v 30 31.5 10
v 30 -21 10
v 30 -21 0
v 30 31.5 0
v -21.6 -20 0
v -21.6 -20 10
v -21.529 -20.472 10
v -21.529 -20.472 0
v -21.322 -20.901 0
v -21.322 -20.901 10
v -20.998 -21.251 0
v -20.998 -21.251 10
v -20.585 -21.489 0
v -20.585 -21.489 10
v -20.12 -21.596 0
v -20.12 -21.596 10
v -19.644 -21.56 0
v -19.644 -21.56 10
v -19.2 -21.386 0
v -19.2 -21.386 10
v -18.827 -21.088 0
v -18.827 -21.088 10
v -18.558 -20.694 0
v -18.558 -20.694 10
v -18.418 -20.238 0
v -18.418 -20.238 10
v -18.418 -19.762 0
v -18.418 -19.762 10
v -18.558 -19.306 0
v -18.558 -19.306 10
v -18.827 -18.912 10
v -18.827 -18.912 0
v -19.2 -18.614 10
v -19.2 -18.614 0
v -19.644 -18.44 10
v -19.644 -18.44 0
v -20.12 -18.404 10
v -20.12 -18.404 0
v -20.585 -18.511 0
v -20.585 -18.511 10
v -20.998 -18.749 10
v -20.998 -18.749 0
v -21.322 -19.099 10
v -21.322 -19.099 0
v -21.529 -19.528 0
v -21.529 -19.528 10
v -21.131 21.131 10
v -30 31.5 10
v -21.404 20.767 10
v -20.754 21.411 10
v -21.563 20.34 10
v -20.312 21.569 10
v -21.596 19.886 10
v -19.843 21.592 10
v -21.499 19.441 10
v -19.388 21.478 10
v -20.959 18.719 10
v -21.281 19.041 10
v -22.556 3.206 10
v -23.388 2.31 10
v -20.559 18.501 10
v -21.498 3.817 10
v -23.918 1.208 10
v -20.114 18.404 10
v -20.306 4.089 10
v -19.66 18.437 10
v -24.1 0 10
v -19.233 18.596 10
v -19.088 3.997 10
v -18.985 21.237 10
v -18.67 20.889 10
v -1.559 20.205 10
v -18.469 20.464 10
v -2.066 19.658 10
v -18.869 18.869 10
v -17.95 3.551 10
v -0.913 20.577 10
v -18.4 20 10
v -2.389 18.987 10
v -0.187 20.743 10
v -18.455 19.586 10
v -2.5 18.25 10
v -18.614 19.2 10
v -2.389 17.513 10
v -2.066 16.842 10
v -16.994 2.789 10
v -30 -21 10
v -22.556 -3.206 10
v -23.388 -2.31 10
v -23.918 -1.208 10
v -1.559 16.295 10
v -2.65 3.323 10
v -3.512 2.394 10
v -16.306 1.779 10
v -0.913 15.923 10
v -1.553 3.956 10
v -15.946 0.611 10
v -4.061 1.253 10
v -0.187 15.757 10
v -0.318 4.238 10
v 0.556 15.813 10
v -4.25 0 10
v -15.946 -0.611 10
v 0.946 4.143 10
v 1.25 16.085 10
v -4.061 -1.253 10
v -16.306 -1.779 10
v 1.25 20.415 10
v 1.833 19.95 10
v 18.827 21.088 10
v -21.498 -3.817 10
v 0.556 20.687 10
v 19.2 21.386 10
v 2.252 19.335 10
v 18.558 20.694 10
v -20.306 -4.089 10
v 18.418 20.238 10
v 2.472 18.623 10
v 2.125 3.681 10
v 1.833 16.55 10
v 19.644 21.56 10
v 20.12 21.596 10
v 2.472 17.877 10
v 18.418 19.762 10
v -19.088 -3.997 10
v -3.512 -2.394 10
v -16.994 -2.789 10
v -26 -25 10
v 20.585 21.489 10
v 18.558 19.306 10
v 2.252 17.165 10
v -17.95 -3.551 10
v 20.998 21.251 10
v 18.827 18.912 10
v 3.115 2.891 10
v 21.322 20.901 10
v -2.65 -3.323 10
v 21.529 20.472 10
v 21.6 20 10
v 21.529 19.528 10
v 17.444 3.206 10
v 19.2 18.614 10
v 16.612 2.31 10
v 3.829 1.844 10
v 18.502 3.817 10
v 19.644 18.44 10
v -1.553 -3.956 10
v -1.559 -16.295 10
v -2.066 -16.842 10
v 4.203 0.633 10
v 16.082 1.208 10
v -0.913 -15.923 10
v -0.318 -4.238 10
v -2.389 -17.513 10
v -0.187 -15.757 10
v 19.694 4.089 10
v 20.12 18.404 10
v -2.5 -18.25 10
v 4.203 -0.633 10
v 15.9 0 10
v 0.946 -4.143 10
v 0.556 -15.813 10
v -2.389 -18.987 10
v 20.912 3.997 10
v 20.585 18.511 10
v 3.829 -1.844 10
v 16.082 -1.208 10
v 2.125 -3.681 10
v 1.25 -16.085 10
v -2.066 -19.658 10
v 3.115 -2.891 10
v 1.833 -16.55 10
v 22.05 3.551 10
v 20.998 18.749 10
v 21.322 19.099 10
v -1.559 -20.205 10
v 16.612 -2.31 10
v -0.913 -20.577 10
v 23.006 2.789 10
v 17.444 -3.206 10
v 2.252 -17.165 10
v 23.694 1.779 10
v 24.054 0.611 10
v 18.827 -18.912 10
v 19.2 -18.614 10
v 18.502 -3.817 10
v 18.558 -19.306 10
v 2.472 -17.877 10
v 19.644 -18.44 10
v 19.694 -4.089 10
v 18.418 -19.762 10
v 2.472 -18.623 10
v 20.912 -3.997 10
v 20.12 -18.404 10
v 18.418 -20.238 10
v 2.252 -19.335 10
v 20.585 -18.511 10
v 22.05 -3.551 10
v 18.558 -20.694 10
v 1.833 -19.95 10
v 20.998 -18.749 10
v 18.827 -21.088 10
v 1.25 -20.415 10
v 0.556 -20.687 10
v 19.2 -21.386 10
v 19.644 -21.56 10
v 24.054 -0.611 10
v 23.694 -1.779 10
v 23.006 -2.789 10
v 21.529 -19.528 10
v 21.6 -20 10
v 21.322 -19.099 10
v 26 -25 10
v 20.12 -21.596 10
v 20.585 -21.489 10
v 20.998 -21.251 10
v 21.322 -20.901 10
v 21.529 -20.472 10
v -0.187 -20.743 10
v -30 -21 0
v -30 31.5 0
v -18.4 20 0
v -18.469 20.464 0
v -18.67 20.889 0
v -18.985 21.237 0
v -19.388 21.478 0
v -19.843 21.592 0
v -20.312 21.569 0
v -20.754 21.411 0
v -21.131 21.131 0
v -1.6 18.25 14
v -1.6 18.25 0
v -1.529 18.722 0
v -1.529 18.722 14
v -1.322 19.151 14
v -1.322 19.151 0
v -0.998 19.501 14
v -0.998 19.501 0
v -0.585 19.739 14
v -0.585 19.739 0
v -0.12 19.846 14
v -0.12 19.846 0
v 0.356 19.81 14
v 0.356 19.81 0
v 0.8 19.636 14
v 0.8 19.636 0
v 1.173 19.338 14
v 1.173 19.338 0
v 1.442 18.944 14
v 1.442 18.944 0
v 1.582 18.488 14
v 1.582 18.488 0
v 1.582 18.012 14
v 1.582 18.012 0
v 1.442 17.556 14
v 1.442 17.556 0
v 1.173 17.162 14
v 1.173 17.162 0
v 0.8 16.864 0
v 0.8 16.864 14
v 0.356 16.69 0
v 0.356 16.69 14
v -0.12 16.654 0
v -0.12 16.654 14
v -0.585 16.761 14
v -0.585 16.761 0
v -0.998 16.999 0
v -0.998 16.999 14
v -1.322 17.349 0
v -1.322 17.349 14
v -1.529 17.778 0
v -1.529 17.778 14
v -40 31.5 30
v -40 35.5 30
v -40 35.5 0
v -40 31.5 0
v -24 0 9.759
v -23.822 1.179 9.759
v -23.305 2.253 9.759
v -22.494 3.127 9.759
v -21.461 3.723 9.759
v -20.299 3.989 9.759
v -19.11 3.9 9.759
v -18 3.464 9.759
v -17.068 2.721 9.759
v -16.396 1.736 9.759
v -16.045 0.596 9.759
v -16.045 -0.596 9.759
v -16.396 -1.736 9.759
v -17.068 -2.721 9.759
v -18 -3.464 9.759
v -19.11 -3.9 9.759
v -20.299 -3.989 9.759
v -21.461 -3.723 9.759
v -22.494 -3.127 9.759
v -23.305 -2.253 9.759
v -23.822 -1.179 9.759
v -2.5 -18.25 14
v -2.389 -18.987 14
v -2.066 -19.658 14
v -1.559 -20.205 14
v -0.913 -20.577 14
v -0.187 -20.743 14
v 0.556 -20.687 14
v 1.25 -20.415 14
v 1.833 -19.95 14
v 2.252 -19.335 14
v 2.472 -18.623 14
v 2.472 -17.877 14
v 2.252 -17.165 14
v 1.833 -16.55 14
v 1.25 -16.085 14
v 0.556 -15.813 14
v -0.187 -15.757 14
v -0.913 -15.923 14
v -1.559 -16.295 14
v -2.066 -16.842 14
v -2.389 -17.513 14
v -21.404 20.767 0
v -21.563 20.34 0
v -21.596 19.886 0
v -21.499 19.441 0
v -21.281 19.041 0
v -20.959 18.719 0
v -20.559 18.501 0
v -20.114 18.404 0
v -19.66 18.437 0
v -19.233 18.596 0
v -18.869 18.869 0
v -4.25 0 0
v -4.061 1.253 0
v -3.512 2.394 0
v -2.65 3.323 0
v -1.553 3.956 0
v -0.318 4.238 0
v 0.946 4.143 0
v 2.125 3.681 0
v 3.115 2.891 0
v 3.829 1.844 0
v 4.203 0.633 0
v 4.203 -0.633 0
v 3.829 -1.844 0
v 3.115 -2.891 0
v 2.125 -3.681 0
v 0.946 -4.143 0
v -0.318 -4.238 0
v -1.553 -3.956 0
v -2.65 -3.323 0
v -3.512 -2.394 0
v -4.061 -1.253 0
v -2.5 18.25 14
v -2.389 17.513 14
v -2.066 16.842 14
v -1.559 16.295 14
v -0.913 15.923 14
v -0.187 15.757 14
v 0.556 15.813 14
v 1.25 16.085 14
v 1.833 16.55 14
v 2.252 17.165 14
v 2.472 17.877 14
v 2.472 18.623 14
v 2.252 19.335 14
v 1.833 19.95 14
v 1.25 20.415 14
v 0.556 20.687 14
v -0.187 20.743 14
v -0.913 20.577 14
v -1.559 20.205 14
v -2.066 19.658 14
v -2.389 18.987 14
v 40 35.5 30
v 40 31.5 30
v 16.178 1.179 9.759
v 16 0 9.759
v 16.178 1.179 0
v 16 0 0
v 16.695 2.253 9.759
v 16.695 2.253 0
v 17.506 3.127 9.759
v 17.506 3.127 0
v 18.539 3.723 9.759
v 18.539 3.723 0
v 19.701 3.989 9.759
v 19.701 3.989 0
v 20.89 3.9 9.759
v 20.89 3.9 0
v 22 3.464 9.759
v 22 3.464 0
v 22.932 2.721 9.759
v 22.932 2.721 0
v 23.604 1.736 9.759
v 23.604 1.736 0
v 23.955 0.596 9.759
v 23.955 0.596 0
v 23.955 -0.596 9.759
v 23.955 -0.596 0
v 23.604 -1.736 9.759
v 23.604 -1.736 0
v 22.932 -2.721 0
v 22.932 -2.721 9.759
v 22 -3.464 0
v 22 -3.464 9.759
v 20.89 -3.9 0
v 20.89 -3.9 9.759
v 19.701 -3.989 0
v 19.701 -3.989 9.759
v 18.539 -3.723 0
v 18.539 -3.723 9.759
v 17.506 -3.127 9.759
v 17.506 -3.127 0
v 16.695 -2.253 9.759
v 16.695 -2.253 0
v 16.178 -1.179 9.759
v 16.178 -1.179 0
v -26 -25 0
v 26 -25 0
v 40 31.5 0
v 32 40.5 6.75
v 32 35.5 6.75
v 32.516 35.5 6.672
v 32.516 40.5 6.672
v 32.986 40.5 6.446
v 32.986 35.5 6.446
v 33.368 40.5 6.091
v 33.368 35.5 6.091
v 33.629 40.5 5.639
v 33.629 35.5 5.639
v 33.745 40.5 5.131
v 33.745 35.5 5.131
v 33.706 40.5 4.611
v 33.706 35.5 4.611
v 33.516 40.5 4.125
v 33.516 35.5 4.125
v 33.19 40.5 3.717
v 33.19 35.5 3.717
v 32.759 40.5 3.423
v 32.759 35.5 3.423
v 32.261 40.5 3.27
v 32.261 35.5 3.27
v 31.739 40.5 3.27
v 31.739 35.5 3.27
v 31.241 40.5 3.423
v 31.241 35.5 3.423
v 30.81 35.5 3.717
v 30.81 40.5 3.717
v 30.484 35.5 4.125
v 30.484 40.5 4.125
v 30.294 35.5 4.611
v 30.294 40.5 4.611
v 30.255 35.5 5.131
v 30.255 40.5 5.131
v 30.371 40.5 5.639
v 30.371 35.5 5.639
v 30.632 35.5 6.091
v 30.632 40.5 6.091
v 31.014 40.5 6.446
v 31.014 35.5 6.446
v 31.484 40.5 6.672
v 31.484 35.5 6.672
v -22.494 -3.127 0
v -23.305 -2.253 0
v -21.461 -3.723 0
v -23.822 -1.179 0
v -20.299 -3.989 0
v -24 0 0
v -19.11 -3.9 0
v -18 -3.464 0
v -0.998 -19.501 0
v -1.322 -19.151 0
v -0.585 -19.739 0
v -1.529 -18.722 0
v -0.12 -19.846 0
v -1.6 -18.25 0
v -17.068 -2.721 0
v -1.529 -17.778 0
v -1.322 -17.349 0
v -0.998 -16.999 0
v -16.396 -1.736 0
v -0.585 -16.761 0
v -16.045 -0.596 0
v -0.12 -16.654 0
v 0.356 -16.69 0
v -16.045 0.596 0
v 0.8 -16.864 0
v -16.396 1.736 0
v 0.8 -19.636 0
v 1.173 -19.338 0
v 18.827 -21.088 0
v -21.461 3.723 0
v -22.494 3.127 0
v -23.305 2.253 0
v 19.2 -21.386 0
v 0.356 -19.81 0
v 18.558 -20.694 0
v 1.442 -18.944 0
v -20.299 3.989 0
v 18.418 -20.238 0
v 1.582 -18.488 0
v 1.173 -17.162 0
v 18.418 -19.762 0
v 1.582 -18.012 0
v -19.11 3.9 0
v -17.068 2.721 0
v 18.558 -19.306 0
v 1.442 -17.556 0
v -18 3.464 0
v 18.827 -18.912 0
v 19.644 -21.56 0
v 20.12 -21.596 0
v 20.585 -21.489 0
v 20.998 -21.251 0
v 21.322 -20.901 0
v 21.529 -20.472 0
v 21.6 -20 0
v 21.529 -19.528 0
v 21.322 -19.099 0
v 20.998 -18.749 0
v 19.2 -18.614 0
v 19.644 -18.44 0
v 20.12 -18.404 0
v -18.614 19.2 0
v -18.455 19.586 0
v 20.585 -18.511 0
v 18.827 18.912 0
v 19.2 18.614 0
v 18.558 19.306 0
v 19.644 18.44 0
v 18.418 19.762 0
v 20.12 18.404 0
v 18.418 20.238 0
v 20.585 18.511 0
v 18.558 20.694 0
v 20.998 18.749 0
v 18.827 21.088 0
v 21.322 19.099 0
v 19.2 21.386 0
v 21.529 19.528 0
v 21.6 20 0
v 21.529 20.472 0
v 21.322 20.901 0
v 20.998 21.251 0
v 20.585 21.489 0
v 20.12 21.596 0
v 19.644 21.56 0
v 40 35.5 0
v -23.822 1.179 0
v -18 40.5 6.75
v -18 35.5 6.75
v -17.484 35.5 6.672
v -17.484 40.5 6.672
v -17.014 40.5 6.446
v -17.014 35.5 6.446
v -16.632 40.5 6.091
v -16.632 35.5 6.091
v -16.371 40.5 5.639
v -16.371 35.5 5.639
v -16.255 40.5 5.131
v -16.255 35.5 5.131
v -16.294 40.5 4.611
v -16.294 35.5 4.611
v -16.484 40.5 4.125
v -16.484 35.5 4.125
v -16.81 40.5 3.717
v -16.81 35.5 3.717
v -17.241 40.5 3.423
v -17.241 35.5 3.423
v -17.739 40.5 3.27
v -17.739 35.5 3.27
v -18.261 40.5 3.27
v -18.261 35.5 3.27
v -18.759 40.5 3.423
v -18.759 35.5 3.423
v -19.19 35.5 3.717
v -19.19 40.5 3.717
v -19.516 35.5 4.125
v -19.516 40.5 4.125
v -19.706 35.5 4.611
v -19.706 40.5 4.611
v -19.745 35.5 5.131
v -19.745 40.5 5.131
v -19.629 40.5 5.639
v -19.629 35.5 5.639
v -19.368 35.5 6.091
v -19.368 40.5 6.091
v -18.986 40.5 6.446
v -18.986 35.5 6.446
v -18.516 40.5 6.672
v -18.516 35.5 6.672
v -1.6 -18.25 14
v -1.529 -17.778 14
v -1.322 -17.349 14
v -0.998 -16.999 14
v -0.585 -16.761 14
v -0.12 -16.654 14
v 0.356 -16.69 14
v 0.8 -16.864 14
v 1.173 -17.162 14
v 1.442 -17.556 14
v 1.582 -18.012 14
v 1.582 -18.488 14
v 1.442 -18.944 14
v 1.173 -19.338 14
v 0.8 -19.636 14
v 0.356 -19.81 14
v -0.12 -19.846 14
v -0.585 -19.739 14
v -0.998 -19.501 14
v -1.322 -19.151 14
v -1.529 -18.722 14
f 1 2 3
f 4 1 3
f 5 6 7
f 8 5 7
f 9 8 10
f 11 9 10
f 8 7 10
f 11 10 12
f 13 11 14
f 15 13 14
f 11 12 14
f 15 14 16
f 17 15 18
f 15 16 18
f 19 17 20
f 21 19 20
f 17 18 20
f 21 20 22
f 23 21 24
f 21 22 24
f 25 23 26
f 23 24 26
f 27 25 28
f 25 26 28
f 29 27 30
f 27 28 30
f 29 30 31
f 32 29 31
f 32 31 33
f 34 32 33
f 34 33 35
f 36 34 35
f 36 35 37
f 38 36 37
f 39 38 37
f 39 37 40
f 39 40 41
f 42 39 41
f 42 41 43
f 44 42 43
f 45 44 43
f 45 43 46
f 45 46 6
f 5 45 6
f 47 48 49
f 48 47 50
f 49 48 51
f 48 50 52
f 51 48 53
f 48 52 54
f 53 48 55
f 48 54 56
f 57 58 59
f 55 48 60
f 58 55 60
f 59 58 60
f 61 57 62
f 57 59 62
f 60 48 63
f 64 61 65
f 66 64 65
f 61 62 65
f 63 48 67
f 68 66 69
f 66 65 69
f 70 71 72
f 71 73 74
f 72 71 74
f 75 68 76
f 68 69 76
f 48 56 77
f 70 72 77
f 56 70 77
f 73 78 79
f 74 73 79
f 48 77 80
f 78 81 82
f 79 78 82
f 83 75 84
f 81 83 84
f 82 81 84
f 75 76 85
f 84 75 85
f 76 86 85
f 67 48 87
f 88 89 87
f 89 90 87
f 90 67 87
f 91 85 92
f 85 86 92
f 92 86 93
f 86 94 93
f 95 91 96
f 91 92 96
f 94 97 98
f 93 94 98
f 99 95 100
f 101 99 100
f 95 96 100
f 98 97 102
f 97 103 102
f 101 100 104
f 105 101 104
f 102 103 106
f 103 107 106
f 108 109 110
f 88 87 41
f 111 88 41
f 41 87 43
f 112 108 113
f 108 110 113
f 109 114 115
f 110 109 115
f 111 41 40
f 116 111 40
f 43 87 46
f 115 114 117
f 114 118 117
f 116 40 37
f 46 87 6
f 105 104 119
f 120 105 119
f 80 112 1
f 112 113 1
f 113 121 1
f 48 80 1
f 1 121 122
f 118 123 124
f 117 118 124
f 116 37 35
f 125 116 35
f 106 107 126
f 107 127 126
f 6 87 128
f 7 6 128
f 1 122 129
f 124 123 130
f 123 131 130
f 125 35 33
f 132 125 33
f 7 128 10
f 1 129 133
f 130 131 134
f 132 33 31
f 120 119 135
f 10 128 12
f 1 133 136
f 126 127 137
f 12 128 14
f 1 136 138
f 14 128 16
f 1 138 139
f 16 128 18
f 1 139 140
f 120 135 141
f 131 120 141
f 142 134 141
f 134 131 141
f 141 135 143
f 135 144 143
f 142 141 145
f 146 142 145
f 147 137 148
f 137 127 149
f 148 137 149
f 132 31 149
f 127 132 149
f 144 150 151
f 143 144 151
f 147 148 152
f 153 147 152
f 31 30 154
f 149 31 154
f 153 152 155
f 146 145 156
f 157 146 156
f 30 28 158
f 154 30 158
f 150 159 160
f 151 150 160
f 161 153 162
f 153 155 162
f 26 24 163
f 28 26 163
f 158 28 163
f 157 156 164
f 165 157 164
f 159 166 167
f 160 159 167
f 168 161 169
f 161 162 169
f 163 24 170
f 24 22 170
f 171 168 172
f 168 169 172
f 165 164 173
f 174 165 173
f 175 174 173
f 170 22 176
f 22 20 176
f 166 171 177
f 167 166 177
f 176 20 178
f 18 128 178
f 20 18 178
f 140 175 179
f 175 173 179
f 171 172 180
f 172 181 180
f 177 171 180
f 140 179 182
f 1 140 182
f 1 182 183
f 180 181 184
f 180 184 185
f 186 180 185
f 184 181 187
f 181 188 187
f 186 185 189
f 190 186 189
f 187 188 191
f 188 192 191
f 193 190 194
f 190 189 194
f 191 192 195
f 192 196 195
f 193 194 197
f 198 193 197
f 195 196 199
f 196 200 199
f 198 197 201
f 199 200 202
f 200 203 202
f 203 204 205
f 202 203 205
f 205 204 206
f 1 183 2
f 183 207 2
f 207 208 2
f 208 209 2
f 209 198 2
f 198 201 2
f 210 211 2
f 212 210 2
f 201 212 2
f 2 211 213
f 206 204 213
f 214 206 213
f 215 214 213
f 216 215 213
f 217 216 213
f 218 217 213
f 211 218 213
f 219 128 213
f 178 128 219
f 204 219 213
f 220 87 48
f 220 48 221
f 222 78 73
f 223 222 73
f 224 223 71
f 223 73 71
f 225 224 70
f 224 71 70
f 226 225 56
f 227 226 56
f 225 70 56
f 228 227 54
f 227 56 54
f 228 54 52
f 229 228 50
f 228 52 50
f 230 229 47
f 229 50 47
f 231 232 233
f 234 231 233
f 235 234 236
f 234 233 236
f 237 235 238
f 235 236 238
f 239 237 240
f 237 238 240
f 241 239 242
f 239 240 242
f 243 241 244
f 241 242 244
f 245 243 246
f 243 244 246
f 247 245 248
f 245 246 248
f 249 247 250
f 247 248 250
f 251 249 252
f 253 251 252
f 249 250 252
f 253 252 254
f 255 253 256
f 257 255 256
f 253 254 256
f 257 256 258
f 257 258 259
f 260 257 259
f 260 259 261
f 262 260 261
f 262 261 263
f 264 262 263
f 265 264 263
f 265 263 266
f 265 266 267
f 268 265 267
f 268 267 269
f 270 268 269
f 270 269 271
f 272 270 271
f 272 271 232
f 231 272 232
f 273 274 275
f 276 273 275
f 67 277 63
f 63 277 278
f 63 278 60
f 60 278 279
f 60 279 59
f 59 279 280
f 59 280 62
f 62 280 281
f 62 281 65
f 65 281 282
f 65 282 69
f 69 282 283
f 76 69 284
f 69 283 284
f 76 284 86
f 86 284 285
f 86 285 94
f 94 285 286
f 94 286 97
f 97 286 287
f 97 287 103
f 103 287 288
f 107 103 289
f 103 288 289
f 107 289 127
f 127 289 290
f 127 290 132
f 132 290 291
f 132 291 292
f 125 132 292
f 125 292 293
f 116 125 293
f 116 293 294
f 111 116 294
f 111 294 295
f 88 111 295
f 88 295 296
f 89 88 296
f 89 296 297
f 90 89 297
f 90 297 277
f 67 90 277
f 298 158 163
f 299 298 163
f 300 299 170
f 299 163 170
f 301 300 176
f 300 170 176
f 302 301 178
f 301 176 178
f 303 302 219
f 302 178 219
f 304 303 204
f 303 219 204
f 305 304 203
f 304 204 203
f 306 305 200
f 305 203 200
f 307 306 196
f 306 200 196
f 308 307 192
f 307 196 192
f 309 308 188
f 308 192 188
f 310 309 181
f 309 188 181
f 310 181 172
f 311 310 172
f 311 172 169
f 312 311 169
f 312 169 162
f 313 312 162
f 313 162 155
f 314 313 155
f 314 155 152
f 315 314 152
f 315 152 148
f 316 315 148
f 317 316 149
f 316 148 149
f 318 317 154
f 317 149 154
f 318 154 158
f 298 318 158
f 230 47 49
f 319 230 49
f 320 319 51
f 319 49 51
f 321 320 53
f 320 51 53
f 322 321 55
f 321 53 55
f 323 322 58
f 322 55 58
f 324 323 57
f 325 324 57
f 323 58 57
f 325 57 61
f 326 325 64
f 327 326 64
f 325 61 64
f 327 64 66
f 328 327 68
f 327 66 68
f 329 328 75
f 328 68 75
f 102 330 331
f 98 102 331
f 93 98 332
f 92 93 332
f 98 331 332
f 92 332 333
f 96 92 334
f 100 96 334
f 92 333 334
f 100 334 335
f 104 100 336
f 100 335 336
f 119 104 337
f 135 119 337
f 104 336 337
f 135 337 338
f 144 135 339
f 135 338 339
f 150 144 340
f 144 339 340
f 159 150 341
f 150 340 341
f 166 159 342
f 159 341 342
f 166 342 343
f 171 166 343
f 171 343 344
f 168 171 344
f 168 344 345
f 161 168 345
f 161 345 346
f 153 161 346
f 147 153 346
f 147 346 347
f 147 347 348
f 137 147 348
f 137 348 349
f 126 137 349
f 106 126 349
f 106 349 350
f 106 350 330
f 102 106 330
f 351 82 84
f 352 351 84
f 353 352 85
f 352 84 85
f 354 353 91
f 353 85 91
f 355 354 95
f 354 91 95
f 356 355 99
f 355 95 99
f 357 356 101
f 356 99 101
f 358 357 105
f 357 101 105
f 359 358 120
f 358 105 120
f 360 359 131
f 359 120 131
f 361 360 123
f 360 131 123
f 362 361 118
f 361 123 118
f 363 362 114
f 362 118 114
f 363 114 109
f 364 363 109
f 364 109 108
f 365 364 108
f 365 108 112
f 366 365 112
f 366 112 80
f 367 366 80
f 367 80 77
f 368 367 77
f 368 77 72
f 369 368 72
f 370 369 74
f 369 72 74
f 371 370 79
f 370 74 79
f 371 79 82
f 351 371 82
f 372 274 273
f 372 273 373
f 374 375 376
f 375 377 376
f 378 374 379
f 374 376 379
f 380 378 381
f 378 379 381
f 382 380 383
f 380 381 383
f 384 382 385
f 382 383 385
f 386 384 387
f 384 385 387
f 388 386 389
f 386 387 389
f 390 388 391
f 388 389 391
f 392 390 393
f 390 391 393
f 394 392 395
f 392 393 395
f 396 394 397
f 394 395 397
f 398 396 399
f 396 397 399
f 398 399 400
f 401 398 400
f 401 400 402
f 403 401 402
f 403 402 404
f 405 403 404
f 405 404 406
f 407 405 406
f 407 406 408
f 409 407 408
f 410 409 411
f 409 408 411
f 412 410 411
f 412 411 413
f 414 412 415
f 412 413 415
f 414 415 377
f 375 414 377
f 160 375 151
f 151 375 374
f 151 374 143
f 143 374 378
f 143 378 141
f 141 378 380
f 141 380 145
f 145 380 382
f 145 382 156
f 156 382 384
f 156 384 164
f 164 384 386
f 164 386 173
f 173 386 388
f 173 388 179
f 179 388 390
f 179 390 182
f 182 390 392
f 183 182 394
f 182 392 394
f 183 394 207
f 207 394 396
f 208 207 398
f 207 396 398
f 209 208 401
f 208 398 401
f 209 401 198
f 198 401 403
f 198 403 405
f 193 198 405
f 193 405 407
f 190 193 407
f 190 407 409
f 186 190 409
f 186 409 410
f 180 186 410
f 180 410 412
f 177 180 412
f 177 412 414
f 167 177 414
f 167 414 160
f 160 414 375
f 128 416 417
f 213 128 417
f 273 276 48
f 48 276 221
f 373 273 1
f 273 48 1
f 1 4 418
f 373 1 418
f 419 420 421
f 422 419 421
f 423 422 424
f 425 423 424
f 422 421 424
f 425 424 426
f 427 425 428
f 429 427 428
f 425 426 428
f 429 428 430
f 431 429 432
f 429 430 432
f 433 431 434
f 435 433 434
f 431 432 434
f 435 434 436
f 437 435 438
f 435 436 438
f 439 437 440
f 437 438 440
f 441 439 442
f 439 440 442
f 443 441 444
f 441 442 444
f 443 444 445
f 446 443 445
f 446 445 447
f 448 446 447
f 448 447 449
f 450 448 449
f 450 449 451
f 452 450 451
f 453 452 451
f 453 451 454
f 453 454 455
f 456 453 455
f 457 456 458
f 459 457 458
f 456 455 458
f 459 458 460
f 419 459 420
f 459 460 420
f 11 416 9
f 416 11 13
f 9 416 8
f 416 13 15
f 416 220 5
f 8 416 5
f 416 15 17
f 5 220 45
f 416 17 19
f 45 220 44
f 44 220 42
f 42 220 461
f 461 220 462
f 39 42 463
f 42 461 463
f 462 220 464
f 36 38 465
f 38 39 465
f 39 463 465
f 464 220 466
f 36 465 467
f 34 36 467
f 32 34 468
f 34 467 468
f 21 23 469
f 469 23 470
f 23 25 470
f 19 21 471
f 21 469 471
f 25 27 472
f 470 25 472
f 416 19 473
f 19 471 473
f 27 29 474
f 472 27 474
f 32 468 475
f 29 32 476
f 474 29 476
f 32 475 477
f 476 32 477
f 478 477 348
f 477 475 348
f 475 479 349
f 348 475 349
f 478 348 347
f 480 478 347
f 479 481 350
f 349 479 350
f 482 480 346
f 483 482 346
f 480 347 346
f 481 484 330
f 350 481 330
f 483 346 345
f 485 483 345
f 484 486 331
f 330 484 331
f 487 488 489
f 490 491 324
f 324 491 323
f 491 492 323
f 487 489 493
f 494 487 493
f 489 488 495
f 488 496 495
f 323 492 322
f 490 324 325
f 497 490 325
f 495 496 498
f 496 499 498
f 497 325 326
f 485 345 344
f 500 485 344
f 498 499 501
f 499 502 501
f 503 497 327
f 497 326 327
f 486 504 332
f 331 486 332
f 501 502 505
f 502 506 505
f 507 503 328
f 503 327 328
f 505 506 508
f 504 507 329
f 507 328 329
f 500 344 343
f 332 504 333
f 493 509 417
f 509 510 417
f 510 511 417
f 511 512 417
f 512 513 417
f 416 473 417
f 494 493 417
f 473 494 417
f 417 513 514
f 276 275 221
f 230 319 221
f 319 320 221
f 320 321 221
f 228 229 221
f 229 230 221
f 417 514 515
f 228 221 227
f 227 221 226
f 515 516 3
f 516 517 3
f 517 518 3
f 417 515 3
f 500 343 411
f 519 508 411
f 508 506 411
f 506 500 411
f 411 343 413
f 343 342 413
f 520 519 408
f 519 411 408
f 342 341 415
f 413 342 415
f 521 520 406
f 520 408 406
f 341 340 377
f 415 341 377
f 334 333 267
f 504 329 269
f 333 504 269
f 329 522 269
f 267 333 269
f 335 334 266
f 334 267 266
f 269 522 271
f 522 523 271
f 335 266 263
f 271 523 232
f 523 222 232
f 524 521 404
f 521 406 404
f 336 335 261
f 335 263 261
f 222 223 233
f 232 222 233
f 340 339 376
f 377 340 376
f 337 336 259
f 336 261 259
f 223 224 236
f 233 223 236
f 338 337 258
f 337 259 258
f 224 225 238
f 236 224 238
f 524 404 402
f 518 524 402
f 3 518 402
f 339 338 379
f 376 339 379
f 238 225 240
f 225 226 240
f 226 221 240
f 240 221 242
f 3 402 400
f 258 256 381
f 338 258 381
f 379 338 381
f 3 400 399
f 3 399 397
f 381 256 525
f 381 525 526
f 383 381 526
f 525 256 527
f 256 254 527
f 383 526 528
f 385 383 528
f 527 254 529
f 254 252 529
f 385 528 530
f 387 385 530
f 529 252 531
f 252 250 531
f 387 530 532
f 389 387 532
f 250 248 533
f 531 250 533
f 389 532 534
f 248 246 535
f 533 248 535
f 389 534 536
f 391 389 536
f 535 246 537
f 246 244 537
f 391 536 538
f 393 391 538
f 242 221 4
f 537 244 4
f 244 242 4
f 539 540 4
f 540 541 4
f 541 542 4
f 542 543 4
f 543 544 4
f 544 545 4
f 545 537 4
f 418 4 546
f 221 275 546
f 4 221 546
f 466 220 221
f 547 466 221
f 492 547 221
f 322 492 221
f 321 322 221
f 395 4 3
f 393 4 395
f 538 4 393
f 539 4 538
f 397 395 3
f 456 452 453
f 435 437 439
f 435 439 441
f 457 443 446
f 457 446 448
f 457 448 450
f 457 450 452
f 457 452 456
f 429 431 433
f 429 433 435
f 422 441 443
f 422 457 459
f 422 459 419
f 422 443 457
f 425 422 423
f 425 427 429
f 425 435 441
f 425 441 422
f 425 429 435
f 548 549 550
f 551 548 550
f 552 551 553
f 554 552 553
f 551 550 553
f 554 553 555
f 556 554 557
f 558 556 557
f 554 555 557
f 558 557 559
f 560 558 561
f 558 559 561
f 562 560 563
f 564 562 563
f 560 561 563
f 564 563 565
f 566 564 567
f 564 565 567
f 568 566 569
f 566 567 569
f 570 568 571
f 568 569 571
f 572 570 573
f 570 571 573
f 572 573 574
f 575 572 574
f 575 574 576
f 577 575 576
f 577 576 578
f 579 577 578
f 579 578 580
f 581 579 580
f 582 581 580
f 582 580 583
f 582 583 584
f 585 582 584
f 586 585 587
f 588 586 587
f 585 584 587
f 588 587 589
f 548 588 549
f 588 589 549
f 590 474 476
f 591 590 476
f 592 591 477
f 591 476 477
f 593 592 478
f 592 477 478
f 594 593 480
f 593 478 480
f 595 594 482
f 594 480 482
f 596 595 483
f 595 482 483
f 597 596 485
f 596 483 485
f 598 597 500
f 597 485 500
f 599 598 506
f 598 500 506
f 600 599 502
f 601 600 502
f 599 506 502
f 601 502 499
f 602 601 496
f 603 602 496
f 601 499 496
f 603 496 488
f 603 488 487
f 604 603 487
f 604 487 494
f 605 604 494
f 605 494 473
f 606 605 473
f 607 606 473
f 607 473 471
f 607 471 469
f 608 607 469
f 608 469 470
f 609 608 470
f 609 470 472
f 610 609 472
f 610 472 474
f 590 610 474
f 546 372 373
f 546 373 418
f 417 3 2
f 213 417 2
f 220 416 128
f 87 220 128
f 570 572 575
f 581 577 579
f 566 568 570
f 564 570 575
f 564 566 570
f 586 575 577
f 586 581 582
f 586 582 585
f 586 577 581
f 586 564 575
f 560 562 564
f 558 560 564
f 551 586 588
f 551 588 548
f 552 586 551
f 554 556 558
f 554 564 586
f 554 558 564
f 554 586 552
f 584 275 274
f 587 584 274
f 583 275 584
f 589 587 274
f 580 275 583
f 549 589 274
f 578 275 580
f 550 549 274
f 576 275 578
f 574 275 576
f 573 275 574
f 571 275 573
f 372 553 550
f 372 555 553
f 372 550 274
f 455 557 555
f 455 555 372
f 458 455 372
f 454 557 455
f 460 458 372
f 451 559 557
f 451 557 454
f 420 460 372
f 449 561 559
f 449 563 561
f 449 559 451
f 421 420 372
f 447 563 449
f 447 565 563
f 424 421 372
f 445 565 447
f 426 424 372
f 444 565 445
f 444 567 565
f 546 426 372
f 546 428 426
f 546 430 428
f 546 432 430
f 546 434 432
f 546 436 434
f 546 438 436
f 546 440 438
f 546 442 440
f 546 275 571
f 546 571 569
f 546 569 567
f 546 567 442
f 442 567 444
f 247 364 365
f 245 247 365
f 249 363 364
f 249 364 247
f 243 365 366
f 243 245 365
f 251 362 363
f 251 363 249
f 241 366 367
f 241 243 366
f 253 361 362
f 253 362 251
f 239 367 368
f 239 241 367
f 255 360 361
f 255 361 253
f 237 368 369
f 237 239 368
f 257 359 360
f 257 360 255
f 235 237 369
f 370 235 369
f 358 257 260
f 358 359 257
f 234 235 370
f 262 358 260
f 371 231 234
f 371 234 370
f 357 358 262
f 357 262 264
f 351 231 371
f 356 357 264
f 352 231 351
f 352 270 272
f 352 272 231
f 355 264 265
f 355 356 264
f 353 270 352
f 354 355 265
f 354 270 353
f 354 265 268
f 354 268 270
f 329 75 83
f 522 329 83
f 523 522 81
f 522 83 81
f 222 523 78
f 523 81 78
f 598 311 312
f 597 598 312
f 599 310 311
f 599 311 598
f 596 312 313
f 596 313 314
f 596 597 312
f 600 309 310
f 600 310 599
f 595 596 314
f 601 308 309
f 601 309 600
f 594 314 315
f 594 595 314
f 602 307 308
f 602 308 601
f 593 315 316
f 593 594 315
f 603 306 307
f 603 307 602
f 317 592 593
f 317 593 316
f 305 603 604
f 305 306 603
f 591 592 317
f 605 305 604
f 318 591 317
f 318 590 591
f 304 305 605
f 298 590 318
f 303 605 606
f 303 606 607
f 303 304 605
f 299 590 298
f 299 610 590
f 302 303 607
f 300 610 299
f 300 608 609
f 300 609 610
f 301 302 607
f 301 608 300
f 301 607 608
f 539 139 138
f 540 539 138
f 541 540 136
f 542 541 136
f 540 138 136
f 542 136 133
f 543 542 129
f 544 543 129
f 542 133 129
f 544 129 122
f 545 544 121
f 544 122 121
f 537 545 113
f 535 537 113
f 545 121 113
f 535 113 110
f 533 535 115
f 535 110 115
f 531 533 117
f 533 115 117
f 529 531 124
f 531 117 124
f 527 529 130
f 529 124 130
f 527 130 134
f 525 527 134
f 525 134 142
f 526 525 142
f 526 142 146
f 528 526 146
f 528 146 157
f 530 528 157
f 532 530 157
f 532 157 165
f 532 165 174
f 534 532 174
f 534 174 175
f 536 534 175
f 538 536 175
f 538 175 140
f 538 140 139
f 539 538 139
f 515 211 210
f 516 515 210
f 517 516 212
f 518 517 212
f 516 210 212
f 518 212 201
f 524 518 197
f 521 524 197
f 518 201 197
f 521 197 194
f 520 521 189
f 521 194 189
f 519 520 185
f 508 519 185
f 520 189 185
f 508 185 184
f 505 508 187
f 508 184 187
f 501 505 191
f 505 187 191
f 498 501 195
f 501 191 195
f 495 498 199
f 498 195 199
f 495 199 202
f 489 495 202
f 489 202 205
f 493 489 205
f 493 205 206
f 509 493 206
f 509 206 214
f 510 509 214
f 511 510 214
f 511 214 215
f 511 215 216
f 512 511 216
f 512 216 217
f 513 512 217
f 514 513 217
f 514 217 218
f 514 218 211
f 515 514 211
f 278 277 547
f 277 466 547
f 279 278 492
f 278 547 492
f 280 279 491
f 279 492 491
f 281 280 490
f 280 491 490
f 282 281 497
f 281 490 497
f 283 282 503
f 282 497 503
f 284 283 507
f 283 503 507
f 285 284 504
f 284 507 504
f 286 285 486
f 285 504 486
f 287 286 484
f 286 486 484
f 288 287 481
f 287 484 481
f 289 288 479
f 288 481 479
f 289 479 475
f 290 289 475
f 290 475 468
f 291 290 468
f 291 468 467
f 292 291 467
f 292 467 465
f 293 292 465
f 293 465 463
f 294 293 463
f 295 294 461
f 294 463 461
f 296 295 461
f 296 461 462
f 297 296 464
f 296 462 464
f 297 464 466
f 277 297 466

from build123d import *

# Parameters (mm, degrees)
SKETCH_1_W                = 60
SKETCH_1_H                = 50
EXTRUDE_1_DEPTH           = 10
HOLE_WIZARD_1_D           = 8.5
HOLE_WIZARD_1_DEPTH       = 20
HOLE_WIZARD_2_D           = 8
HOLE_WIZARD_2_CSINK_D     = 8.2
HOLE_WIZARD_2_CSINK_ANGLE = 45
SKETCH_9_R                = 2.5
EXTRUDE_3_DEPTH           = 4
HOLE_WIZARD_3_D           = 3.2
CHAMFER_1_SIZE            = 4
SKETCH_15_R               = 1.6
CUT_EXTRUDE_1_DEPTH       = 41.311288741
SKETCH_16_W               = 60
SKETCH_16_H               = 10
EXTRUDE_4_DEPTH           = 10.5
SKETCH_17_W               = 80
SKETCH_17_H               = 30
EXTRUDE_5_DEPTH           = 4
SKETCH_18_R               = 1.75
EXTRUDE_6_DEPTH           = 5


with BuildPart() as part:
    # 草图1 → 凸台-拉伸1 (new body)
    with BuildSketch(Plane.XY):
        Rectangle(SKETCH_1_W, SKETCH_1_H)
    extrude(amount=EXTRUDE_1_DEPTH)

    # 孔1
    with Locations(Plane.XY.offset(10)):
        with Locations((0, 0)):
            Hole(HOLE_WIZARD_1_D / 2, depth=HOLE_WIZARD_1_DEPTH)

    # 孔2 (through all)
    with Locations(Plane.XY.offset(10)):
        with Locations((20, 0), (-20, 0)):
            CounterSinkHole(HOLE_WIZARD_2_D / 2, HOLE_WIZARD_2_CSINK_D / 2, counter_sink_angle=HOLE_WIZARD_2_CSINK_ANGLE)

    # 草图9 → 凸台-拉伸3 (add)
    with BuildSketch(Plane.XY.offset(10)):
        with Locations(Location((0, 18.25, 0), (0, 0, 180))):
            Circle(SKETCH_9_R)
        with Locations(Location((0, -18.25, 0), (0, 0, 180))):
            Circle(SKETCH_9_R)
    extrude(amount=EXTRUDE_3_DEPTH)

    # 孔3 (through all)
    with Locations(Plane.XY.offset(14)):
        with Locations((0, 18.25), (0, -18.25)):
            Hole(HOLE_WIZARD_3_D / 2)

    # 倒角1
    chamfer_1_edges = [part.edges().sort_by_distance(p)[0] for p in [
        (30, -25, 5),
        (-30, -25, 5),
    ]]
    chamfer(chamfer_1_edges, length=CHAMFER_1_SIZE)

    # 草图15 → 切除-拉伸1 (cut, through all)
    with BuildSketch(Plane.XY.offset(10)):
        with BuildLine():
            ThreePointArc((-21.13137085, 21.13137085), (-21.13137085, 18.86862915), (-18.86862915, 18.86862915))
            Line((-18.86862915, 18.86862915), (-21.13137085, 21.13137085))
        make_face()
        with BuildLine():
            Line((-21.13137085, 21.13137085), (-18.86862915, 18.86862915))
            ThreePointArc((-18.86862915, 18.86862915), (-18.521792748, 19.387706508), (-18.4, 20))
            ThreePointArc((-18.4, 20), (-19.387706508, 21.478207252), (-21.13137085, 21.13137085))
        make_face()
        with Locations((20, 20)):
            Circle(SKETCH_15_R)
        with Locations((20, -20)):
            Circle(SKETCH_15_R)
        with Locations(Location((-20, -20, 0), (0, 0, 180))):
            Circle(SKETCH_15_R)
    extrude(amount=-CUT_EXTRUDE_1_DEPTH, mode=Mode.SUBTRACT)

    # 草图16 → 凸台-拉伸4 (add)
    with BuildSketch(Plane(origin=(0, 25, 0), x_dir=(1, 0, 0), z_dir=(0, 1, 0))):
        with Locations((0, -5)):
            Rectangle(SKETCH_16_W, SKETCH_16_H)
    extrude(amount=EXTRUDE_4_DEPTH)

    # 草图17 → 凸台-拉伸5 (add)
    with BuildSketch(Plane(origin=(0, 35.5, 0), x_dir=(1, 0, 0), z_dir=(0, 1, 0))):
        with Locations((0, -15)):
            Rectangle(SKETCH_17_W, SKETCH_17_H)
    extrude(amount=-EXTRUDE_5_DEPTH)

    # 草图18 → 凸台-拉伸6 (add)
    with BuildSketch(Plane(origin=(0, 35.5, 0), x_dir=(1, 0, 0), z_dir=(0, 1, 0))):
        with Locations(Location((32, -5, 0), (0, 0, 270))):
            Circle(SKETCH_18_R)
        with Locations(Location((-18, -5, 0), (0, 0, 270))):
            Circle(SKETCH_18_R)
    extrude(amount=EXTRUDE_6_DEPTH)


solid = part.part
